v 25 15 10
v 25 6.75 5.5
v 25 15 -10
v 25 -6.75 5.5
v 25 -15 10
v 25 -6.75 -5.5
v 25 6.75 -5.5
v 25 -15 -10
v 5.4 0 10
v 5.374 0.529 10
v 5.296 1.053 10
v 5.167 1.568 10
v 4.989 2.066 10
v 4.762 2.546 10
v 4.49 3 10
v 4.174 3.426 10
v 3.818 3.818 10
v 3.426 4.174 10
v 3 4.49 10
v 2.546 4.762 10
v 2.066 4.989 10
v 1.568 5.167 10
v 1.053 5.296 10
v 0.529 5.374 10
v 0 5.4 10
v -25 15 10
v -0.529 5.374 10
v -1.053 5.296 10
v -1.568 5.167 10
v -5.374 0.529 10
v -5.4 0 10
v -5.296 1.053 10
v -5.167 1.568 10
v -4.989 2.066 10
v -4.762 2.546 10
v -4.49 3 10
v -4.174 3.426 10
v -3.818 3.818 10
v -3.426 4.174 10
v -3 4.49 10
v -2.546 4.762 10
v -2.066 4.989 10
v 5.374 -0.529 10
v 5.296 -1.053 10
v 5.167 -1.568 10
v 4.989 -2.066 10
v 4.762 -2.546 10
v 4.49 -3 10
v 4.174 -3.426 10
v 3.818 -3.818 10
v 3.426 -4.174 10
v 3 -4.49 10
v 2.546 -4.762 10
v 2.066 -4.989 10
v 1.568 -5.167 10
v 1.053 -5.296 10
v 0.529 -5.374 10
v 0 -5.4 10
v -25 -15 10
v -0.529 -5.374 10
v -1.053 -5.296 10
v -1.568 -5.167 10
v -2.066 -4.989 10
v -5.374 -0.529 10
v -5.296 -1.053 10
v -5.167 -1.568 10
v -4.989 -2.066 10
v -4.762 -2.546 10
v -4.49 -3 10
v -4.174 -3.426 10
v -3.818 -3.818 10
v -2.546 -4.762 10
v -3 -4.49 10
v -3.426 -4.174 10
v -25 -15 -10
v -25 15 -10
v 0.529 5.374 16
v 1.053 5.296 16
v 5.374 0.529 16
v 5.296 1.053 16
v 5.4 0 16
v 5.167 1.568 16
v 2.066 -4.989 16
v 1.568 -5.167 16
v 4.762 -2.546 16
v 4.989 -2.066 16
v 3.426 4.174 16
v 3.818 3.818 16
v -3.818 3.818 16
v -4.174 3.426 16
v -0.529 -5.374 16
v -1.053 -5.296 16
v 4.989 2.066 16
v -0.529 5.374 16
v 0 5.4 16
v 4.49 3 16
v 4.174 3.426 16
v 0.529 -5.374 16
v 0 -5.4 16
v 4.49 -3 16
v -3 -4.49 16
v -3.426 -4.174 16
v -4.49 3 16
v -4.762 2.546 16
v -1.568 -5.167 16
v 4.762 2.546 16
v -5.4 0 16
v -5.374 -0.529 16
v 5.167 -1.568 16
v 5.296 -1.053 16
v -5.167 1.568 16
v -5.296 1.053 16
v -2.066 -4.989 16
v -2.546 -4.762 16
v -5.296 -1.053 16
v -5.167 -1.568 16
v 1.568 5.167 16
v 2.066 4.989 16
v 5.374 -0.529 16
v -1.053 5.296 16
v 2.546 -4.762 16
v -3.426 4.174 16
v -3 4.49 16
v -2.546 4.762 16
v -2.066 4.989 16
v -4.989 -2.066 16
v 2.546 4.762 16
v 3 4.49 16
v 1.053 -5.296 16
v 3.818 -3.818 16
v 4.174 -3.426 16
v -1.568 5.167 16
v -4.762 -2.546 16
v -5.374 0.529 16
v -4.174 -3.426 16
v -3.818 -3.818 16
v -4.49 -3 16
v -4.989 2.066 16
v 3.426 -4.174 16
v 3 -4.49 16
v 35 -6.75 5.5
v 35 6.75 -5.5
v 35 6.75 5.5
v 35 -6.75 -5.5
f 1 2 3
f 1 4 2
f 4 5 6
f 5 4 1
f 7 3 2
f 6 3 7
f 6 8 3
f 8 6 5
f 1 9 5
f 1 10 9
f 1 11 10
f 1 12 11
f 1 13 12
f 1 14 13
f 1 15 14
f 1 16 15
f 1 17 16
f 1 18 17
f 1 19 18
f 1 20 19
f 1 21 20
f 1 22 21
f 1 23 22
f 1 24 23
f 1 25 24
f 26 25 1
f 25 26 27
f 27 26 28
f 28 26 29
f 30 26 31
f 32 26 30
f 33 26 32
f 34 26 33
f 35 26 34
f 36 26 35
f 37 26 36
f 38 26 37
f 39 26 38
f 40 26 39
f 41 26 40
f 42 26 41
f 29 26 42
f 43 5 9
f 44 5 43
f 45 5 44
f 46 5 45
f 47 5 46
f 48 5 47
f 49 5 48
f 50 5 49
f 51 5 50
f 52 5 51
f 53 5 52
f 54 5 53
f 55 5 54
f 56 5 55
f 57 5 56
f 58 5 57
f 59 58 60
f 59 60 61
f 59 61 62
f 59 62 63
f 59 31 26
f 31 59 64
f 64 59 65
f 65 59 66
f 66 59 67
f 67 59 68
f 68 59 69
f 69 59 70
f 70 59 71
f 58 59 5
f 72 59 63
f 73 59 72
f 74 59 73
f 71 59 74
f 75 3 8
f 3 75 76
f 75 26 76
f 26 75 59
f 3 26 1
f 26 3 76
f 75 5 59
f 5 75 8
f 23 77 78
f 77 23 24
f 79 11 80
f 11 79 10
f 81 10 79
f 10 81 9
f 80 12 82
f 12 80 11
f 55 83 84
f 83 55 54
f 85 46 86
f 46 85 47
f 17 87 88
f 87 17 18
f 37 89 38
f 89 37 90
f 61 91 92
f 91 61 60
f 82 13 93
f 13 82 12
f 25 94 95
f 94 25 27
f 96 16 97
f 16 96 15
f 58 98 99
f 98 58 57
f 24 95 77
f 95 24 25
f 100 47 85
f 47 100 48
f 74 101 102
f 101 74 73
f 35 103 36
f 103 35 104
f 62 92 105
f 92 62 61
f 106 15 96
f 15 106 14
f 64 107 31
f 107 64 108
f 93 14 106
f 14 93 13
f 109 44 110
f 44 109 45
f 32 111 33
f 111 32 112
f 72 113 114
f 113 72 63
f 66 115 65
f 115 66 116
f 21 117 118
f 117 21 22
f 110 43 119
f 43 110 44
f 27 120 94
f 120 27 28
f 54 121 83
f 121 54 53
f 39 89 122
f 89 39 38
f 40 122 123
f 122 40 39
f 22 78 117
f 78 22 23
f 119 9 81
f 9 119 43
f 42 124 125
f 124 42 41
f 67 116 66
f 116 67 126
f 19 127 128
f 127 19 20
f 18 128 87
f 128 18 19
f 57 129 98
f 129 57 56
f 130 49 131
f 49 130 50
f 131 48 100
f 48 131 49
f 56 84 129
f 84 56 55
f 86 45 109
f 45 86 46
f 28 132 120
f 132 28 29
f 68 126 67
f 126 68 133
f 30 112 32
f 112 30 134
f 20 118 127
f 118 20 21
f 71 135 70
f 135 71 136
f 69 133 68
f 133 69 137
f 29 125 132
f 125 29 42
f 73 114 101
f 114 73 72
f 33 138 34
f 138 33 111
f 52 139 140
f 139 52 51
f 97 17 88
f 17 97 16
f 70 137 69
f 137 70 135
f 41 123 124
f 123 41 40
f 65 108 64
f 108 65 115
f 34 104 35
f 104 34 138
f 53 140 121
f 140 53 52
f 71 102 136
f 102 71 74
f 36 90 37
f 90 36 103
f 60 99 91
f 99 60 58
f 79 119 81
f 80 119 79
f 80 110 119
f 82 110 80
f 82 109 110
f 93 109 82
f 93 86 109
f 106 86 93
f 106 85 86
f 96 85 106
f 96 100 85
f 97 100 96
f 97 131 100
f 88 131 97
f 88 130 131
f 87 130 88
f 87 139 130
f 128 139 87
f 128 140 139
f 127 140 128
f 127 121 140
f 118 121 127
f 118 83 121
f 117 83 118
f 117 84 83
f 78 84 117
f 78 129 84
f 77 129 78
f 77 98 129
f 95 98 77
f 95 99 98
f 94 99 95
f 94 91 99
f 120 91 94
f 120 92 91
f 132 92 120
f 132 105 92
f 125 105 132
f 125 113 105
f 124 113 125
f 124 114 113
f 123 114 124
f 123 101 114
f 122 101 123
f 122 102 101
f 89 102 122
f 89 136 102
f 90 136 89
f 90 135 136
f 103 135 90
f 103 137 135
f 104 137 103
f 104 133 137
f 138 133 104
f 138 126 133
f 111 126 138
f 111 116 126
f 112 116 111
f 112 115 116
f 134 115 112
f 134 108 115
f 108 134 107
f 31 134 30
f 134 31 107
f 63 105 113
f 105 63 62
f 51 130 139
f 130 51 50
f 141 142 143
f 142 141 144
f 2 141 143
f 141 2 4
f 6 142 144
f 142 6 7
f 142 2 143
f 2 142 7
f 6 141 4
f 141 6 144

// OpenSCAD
// Parameters
body_length = 50; //[25:100:1]
body_width  = 30; //[15:60:1]
body_height = 20; //[10:40:1]

// Robustness
eps = 0.01;
L = max(body_length, eps);
W = max(body_width,  eps);
H = max(body_height, eps);

// Small overlap to guarantee connectivity
overlap = 1;

// Connected component: main block + top boss + side lug (all dimension-driven)
module component() {
    boss_r = max(min(L, W) * 0.18, 2);
    boss_h = max(H * 0.35, 2);

    lug_w = max(L * 0.22, 2);
    lug_d = max(W * 0.45, 2);
    lug_h = max(H * 0.55, 2);

    union() {
        // Main body
        cube([L, W, H], center=true);

        // Top boss (connected to top face with overlap)
        translate([0, 0, H/2 + boss_h/2 - overlap])
            cylinder(r=boss_r, h=boss_h, center=true, $fn=64);

        // Side lug (connected to +X face with overlap)
        translate([L/2 + lug_w/2 - overlap, 0, 0])
            cube([lug_w, lug_d, lug_h], center=true);
    }
}

component();
